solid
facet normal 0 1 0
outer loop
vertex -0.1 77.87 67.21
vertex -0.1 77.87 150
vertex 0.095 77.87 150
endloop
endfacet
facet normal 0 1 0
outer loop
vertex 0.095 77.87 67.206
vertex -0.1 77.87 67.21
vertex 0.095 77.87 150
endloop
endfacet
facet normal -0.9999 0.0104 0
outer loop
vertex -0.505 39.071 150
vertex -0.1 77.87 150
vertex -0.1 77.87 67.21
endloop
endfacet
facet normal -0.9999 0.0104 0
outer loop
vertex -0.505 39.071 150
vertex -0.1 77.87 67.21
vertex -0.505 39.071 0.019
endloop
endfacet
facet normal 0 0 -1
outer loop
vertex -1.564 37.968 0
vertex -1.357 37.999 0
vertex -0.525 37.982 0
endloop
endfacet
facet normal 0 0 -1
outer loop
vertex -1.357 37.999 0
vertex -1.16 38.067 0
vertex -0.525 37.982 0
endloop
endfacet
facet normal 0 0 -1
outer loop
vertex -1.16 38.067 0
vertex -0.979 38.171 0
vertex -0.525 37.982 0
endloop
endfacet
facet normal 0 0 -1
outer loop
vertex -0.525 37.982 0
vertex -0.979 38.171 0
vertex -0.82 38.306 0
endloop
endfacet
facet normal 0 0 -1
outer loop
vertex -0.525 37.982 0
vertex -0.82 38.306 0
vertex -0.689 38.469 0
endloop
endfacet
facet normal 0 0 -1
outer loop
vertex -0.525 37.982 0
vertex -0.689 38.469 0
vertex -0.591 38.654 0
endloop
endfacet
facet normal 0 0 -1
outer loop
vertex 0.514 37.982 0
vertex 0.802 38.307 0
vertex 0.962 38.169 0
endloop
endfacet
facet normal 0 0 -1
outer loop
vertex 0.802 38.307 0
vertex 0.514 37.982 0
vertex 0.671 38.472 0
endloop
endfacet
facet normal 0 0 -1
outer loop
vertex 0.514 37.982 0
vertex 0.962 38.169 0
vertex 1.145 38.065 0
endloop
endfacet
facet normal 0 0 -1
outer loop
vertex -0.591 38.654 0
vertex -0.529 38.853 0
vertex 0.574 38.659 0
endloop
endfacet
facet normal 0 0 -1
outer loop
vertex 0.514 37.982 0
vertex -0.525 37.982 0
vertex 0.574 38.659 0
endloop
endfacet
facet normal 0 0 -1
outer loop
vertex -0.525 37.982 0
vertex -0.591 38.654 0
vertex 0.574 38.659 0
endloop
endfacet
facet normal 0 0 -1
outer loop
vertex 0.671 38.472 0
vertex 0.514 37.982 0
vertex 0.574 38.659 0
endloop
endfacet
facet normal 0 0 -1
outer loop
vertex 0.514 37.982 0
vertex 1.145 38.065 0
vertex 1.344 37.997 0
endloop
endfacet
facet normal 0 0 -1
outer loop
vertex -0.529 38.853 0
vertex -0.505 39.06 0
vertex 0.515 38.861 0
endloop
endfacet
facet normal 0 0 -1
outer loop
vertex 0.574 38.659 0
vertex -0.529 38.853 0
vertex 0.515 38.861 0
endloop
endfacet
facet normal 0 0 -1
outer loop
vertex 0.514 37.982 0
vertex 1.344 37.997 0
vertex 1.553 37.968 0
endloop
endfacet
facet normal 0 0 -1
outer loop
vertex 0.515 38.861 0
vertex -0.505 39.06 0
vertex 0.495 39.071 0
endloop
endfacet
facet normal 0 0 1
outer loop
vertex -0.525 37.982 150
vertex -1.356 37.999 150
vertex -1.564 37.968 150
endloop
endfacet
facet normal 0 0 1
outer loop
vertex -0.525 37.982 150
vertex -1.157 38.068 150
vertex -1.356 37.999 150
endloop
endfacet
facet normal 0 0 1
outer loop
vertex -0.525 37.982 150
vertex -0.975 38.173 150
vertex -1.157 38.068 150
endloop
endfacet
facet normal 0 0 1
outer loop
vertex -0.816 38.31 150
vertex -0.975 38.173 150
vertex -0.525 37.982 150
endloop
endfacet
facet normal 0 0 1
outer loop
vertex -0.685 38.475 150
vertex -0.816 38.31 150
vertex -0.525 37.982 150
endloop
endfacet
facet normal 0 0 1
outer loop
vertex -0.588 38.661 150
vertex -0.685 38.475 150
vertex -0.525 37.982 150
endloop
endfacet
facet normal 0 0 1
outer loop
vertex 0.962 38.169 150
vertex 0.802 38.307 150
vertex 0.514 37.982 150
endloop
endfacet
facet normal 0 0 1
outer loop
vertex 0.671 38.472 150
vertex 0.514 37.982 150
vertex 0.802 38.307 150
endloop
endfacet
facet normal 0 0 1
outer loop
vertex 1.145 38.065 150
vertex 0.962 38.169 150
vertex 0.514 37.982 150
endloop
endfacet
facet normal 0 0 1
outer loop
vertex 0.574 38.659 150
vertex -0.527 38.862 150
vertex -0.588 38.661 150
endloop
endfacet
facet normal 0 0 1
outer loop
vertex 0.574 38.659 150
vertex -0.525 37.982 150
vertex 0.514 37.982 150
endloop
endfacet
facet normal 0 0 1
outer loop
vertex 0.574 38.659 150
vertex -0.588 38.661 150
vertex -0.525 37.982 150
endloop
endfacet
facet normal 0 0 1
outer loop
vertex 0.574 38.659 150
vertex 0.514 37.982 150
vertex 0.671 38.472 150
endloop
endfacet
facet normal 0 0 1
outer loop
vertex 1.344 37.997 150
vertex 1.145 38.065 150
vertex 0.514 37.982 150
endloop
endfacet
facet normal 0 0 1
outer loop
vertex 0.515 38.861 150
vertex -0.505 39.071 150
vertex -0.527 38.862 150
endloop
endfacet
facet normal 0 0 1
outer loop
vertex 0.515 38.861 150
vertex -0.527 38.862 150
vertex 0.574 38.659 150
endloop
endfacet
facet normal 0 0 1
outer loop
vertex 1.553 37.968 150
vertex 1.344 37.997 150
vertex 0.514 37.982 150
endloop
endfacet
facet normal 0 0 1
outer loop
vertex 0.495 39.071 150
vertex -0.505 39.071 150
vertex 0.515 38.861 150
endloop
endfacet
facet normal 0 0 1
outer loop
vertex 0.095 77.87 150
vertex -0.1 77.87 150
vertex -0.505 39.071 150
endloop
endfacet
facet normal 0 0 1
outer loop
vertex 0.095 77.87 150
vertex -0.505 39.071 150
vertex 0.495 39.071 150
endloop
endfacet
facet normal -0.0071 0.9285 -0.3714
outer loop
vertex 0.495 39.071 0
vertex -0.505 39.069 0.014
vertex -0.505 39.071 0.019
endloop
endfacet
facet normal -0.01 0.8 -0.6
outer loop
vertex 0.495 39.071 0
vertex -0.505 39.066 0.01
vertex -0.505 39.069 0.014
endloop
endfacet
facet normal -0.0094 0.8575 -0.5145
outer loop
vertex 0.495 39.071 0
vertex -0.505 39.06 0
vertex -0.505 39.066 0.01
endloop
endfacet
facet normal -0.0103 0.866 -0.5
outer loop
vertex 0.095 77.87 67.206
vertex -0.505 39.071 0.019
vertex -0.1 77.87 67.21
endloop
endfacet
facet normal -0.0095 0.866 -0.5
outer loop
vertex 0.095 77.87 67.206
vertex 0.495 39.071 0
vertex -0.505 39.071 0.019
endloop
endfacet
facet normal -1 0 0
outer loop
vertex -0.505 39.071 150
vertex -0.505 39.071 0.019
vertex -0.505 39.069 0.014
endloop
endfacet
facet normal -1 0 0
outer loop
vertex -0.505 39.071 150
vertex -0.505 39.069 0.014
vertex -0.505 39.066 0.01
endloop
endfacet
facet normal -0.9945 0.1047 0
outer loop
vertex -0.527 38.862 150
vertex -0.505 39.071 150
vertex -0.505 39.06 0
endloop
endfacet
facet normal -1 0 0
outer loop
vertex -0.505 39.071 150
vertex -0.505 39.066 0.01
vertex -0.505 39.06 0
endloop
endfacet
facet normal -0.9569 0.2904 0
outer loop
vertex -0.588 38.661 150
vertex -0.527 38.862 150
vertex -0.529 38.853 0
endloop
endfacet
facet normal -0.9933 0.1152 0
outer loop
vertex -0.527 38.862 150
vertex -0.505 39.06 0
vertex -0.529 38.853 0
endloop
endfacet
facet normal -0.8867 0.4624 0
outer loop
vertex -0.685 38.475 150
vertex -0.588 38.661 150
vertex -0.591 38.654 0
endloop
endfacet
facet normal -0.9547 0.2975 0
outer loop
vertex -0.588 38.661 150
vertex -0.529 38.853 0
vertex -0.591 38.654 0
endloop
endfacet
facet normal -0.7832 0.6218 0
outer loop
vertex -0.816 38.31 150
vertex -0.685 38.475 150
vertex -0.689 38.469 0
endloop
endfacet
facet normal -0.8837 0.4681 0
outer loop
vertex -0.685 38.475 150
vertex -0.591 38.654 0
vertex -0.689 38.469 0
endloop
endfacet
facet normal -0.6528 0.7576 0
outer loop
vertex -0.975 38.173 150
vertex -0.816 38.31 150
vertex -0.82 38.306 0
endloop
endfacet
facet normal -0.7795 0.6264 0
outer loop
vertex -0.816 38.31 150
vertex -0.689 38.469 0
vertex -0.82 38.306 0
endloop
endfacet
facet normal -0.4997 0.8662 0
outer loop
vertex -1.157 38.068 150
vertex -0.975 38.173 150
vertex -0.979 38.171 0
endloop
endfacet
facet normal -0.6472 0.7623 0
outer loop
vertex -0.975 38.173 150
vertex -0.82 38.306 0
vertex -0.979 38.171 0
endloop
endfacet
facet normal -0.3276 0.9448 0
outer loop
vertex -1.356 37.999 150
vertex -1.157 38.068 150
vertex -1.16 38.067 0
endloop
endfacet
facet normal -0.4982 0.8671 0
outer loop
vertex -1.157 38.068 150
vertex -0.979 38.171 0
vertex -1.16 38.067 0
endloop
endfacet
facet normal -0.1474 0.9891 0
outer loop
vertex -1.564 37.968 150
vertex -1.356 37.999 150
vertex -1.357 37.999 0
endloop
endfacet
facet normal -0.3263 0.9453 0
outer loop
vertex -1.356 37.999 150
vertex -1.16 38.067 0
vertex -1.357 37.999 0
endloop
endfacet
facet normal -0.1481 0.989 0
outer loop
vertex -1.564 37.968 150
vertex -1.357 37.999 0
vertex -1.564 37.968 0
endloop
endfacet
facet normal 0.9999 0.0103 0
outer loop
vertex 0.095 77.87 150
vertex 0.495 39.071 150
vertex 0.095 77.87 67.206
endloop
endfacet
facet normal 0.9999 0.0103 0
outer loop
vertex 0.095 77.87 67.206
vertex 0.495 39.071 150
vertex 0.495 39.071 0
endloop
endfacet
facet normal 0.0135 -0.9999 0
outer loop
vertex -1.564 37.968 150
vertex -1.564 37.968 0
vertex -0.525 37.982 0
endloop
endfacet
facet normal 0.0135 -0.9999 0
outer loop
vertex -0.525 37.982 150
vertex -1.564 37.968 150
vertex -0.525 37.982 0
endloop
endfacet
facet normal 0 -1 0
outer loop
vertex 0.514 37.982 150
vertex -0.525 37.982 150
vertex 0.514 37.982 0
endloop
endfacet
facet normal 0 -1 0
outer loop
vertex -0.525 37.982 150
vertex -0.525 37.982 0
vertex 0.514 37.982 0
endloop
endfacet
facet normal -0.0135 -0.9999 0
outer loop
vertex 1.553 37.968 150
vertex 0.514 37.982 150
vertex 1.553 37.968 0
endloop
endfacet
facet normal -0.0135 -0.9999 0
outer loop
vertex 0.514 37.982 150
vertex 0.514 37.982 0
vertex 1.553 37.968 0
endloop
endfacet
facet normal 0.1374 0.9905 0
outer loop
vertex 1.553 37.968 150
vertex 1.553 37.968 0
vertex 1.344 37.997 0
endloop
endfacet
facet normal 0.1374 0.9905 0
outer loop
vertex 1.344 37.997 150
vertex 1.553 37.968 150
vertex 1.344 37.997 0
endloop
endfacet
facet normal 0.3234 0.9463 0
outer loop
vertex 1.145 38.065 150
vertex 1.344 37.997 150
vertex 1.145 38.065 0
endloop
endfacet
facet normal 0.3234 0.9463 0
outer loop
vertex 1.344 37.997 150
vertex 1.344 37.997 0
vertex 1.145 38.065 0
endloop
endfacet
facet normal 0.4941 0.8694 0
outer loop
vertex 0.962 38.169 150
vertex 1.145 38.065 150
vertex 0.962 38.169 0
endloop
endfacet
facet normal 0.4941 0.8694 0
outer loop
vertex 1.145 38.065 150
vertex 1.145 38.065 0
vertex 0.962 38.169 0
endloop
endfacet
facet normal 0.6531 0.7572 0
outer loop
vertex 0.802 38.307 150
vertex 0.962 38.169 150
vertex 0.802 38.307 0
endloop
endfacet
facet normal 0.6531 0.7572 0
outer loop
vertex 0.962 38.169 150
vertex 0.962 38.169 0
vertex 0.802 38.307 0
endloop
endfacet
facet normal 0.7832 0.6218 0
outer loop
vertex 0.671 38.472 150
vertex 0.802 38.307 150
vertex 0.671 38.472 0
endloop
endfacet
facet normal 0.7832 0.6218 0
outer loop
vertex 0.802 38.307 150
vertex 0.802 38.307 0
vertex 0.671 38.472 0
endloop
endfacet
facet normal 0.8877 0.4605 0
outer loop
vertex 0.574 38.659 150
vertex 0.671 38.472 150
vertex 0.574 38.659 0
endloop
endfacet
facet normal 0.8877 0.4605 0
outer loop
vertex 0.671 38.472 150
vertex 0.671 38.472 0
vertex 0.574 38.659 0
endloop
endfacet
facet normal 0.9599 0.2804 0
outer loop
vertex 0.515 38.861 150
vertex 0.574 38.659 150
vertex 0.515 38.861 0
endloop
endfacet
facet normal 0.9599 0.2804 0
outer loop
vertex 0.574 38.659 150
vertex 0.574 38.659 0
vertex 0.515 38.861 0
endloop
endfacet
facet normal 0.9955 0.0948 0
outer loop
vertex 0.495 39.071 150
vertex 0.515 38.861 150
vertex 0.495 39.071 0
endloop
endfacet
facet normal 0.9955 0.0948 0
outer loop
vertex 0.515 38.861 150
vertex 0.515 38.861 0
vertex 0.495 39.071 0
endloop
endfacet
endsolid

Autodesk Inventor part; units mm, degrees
ref_plane "YZ Plane" through (0, 0, 0) normal (1, 0, 0) x (0, 1, 0)
ref_plane "XZ Plane" through (0, 0, 0) normal (0, 1, 0) x (-1, 0, 0)
ref_plane "XY Plane" through (0, 0, 0) normal (0, 0, 1) x (1, 0, 0)
sketch "Sketch1" plane through (0, 0, 0) normal (0, 0, 1) x (1, 0, 0)
  line L0 (-0.0053, 77.8701) -> (0.4947, 77.8701)
  line L1 (0.4947, 77.8701) -> (-0.5053, 77.8701)
  arc A0 (0.4947, 39.0706) -> (1.5528, 37.9683) centre (1.5979, 39.0706) ccw
  arc A1 (-1.5635, 37.9683) -> (-0.5053, 39.0714) centre (-1.6216, 39.0831) ccw
  line L2 (0.4947, 77.8701) -> (0.4947, 39.0706)
  line L3 (-0.5053, 77.8701) -> (-0.5053, 39.0714)
  arc A2 (1.5528, 37.9683) -> (-1.5635, 37.9683) centre (-0.0053, -38.0158) ccw
  line L4 (-0.0053, 77.8701) -> (0.0947, 77.8701)
  line L5 (-0.0053, 76.9579) -> (-0.0053, 77.45)
  line L6 (0.4947, 77.8701) -> (0.4947, 39.0706)
  line L7 (0.4947, 39.0706) -> (0.0947, 77.8701)
  line L8 (0, 77.8701) -> (-0.1, 77.8701)
  line L9 (-0.1, 77.8701) -> (-0.5053, 39.0714)
  point P0 (0, 0)
  dimension "d2" = 0.5
  dimension "d3" = 1
  dimension "d7" = 76
  dimension "d9" = 0.1
  dimension "d11" = 0.1
extrude "Extrusion1" add sketch "Sketch1" along normal blind 150 contours L0 L7 A0 A2 A1 L9 L1
sketch "Sketch2" plane through (0.0947, 77.8701, 150) normal (0.9999469, 0.0103089, 0) x (0, 0, -1)
  line L0 (150, -38.8016) -> (43.624, 22.6146)
  line L1 (150, -38.8016) -> (272.8324, -38.8016) construction
  line L2 (150, 0) -> (150, -38.8016)
  line L3 (150, -38.8016) -> (150, 6.7888)
  line L4 (150, 6.7888) -> (63.7901, 6.7888)
  point P0 (150, -77.865)
  point P1 (71.0352, 6.7888)
  dimension "d14" = 150
extrude "Extrusion2" cut sketch "Sketch2" against normal through all
properties part number "ALETAS"
